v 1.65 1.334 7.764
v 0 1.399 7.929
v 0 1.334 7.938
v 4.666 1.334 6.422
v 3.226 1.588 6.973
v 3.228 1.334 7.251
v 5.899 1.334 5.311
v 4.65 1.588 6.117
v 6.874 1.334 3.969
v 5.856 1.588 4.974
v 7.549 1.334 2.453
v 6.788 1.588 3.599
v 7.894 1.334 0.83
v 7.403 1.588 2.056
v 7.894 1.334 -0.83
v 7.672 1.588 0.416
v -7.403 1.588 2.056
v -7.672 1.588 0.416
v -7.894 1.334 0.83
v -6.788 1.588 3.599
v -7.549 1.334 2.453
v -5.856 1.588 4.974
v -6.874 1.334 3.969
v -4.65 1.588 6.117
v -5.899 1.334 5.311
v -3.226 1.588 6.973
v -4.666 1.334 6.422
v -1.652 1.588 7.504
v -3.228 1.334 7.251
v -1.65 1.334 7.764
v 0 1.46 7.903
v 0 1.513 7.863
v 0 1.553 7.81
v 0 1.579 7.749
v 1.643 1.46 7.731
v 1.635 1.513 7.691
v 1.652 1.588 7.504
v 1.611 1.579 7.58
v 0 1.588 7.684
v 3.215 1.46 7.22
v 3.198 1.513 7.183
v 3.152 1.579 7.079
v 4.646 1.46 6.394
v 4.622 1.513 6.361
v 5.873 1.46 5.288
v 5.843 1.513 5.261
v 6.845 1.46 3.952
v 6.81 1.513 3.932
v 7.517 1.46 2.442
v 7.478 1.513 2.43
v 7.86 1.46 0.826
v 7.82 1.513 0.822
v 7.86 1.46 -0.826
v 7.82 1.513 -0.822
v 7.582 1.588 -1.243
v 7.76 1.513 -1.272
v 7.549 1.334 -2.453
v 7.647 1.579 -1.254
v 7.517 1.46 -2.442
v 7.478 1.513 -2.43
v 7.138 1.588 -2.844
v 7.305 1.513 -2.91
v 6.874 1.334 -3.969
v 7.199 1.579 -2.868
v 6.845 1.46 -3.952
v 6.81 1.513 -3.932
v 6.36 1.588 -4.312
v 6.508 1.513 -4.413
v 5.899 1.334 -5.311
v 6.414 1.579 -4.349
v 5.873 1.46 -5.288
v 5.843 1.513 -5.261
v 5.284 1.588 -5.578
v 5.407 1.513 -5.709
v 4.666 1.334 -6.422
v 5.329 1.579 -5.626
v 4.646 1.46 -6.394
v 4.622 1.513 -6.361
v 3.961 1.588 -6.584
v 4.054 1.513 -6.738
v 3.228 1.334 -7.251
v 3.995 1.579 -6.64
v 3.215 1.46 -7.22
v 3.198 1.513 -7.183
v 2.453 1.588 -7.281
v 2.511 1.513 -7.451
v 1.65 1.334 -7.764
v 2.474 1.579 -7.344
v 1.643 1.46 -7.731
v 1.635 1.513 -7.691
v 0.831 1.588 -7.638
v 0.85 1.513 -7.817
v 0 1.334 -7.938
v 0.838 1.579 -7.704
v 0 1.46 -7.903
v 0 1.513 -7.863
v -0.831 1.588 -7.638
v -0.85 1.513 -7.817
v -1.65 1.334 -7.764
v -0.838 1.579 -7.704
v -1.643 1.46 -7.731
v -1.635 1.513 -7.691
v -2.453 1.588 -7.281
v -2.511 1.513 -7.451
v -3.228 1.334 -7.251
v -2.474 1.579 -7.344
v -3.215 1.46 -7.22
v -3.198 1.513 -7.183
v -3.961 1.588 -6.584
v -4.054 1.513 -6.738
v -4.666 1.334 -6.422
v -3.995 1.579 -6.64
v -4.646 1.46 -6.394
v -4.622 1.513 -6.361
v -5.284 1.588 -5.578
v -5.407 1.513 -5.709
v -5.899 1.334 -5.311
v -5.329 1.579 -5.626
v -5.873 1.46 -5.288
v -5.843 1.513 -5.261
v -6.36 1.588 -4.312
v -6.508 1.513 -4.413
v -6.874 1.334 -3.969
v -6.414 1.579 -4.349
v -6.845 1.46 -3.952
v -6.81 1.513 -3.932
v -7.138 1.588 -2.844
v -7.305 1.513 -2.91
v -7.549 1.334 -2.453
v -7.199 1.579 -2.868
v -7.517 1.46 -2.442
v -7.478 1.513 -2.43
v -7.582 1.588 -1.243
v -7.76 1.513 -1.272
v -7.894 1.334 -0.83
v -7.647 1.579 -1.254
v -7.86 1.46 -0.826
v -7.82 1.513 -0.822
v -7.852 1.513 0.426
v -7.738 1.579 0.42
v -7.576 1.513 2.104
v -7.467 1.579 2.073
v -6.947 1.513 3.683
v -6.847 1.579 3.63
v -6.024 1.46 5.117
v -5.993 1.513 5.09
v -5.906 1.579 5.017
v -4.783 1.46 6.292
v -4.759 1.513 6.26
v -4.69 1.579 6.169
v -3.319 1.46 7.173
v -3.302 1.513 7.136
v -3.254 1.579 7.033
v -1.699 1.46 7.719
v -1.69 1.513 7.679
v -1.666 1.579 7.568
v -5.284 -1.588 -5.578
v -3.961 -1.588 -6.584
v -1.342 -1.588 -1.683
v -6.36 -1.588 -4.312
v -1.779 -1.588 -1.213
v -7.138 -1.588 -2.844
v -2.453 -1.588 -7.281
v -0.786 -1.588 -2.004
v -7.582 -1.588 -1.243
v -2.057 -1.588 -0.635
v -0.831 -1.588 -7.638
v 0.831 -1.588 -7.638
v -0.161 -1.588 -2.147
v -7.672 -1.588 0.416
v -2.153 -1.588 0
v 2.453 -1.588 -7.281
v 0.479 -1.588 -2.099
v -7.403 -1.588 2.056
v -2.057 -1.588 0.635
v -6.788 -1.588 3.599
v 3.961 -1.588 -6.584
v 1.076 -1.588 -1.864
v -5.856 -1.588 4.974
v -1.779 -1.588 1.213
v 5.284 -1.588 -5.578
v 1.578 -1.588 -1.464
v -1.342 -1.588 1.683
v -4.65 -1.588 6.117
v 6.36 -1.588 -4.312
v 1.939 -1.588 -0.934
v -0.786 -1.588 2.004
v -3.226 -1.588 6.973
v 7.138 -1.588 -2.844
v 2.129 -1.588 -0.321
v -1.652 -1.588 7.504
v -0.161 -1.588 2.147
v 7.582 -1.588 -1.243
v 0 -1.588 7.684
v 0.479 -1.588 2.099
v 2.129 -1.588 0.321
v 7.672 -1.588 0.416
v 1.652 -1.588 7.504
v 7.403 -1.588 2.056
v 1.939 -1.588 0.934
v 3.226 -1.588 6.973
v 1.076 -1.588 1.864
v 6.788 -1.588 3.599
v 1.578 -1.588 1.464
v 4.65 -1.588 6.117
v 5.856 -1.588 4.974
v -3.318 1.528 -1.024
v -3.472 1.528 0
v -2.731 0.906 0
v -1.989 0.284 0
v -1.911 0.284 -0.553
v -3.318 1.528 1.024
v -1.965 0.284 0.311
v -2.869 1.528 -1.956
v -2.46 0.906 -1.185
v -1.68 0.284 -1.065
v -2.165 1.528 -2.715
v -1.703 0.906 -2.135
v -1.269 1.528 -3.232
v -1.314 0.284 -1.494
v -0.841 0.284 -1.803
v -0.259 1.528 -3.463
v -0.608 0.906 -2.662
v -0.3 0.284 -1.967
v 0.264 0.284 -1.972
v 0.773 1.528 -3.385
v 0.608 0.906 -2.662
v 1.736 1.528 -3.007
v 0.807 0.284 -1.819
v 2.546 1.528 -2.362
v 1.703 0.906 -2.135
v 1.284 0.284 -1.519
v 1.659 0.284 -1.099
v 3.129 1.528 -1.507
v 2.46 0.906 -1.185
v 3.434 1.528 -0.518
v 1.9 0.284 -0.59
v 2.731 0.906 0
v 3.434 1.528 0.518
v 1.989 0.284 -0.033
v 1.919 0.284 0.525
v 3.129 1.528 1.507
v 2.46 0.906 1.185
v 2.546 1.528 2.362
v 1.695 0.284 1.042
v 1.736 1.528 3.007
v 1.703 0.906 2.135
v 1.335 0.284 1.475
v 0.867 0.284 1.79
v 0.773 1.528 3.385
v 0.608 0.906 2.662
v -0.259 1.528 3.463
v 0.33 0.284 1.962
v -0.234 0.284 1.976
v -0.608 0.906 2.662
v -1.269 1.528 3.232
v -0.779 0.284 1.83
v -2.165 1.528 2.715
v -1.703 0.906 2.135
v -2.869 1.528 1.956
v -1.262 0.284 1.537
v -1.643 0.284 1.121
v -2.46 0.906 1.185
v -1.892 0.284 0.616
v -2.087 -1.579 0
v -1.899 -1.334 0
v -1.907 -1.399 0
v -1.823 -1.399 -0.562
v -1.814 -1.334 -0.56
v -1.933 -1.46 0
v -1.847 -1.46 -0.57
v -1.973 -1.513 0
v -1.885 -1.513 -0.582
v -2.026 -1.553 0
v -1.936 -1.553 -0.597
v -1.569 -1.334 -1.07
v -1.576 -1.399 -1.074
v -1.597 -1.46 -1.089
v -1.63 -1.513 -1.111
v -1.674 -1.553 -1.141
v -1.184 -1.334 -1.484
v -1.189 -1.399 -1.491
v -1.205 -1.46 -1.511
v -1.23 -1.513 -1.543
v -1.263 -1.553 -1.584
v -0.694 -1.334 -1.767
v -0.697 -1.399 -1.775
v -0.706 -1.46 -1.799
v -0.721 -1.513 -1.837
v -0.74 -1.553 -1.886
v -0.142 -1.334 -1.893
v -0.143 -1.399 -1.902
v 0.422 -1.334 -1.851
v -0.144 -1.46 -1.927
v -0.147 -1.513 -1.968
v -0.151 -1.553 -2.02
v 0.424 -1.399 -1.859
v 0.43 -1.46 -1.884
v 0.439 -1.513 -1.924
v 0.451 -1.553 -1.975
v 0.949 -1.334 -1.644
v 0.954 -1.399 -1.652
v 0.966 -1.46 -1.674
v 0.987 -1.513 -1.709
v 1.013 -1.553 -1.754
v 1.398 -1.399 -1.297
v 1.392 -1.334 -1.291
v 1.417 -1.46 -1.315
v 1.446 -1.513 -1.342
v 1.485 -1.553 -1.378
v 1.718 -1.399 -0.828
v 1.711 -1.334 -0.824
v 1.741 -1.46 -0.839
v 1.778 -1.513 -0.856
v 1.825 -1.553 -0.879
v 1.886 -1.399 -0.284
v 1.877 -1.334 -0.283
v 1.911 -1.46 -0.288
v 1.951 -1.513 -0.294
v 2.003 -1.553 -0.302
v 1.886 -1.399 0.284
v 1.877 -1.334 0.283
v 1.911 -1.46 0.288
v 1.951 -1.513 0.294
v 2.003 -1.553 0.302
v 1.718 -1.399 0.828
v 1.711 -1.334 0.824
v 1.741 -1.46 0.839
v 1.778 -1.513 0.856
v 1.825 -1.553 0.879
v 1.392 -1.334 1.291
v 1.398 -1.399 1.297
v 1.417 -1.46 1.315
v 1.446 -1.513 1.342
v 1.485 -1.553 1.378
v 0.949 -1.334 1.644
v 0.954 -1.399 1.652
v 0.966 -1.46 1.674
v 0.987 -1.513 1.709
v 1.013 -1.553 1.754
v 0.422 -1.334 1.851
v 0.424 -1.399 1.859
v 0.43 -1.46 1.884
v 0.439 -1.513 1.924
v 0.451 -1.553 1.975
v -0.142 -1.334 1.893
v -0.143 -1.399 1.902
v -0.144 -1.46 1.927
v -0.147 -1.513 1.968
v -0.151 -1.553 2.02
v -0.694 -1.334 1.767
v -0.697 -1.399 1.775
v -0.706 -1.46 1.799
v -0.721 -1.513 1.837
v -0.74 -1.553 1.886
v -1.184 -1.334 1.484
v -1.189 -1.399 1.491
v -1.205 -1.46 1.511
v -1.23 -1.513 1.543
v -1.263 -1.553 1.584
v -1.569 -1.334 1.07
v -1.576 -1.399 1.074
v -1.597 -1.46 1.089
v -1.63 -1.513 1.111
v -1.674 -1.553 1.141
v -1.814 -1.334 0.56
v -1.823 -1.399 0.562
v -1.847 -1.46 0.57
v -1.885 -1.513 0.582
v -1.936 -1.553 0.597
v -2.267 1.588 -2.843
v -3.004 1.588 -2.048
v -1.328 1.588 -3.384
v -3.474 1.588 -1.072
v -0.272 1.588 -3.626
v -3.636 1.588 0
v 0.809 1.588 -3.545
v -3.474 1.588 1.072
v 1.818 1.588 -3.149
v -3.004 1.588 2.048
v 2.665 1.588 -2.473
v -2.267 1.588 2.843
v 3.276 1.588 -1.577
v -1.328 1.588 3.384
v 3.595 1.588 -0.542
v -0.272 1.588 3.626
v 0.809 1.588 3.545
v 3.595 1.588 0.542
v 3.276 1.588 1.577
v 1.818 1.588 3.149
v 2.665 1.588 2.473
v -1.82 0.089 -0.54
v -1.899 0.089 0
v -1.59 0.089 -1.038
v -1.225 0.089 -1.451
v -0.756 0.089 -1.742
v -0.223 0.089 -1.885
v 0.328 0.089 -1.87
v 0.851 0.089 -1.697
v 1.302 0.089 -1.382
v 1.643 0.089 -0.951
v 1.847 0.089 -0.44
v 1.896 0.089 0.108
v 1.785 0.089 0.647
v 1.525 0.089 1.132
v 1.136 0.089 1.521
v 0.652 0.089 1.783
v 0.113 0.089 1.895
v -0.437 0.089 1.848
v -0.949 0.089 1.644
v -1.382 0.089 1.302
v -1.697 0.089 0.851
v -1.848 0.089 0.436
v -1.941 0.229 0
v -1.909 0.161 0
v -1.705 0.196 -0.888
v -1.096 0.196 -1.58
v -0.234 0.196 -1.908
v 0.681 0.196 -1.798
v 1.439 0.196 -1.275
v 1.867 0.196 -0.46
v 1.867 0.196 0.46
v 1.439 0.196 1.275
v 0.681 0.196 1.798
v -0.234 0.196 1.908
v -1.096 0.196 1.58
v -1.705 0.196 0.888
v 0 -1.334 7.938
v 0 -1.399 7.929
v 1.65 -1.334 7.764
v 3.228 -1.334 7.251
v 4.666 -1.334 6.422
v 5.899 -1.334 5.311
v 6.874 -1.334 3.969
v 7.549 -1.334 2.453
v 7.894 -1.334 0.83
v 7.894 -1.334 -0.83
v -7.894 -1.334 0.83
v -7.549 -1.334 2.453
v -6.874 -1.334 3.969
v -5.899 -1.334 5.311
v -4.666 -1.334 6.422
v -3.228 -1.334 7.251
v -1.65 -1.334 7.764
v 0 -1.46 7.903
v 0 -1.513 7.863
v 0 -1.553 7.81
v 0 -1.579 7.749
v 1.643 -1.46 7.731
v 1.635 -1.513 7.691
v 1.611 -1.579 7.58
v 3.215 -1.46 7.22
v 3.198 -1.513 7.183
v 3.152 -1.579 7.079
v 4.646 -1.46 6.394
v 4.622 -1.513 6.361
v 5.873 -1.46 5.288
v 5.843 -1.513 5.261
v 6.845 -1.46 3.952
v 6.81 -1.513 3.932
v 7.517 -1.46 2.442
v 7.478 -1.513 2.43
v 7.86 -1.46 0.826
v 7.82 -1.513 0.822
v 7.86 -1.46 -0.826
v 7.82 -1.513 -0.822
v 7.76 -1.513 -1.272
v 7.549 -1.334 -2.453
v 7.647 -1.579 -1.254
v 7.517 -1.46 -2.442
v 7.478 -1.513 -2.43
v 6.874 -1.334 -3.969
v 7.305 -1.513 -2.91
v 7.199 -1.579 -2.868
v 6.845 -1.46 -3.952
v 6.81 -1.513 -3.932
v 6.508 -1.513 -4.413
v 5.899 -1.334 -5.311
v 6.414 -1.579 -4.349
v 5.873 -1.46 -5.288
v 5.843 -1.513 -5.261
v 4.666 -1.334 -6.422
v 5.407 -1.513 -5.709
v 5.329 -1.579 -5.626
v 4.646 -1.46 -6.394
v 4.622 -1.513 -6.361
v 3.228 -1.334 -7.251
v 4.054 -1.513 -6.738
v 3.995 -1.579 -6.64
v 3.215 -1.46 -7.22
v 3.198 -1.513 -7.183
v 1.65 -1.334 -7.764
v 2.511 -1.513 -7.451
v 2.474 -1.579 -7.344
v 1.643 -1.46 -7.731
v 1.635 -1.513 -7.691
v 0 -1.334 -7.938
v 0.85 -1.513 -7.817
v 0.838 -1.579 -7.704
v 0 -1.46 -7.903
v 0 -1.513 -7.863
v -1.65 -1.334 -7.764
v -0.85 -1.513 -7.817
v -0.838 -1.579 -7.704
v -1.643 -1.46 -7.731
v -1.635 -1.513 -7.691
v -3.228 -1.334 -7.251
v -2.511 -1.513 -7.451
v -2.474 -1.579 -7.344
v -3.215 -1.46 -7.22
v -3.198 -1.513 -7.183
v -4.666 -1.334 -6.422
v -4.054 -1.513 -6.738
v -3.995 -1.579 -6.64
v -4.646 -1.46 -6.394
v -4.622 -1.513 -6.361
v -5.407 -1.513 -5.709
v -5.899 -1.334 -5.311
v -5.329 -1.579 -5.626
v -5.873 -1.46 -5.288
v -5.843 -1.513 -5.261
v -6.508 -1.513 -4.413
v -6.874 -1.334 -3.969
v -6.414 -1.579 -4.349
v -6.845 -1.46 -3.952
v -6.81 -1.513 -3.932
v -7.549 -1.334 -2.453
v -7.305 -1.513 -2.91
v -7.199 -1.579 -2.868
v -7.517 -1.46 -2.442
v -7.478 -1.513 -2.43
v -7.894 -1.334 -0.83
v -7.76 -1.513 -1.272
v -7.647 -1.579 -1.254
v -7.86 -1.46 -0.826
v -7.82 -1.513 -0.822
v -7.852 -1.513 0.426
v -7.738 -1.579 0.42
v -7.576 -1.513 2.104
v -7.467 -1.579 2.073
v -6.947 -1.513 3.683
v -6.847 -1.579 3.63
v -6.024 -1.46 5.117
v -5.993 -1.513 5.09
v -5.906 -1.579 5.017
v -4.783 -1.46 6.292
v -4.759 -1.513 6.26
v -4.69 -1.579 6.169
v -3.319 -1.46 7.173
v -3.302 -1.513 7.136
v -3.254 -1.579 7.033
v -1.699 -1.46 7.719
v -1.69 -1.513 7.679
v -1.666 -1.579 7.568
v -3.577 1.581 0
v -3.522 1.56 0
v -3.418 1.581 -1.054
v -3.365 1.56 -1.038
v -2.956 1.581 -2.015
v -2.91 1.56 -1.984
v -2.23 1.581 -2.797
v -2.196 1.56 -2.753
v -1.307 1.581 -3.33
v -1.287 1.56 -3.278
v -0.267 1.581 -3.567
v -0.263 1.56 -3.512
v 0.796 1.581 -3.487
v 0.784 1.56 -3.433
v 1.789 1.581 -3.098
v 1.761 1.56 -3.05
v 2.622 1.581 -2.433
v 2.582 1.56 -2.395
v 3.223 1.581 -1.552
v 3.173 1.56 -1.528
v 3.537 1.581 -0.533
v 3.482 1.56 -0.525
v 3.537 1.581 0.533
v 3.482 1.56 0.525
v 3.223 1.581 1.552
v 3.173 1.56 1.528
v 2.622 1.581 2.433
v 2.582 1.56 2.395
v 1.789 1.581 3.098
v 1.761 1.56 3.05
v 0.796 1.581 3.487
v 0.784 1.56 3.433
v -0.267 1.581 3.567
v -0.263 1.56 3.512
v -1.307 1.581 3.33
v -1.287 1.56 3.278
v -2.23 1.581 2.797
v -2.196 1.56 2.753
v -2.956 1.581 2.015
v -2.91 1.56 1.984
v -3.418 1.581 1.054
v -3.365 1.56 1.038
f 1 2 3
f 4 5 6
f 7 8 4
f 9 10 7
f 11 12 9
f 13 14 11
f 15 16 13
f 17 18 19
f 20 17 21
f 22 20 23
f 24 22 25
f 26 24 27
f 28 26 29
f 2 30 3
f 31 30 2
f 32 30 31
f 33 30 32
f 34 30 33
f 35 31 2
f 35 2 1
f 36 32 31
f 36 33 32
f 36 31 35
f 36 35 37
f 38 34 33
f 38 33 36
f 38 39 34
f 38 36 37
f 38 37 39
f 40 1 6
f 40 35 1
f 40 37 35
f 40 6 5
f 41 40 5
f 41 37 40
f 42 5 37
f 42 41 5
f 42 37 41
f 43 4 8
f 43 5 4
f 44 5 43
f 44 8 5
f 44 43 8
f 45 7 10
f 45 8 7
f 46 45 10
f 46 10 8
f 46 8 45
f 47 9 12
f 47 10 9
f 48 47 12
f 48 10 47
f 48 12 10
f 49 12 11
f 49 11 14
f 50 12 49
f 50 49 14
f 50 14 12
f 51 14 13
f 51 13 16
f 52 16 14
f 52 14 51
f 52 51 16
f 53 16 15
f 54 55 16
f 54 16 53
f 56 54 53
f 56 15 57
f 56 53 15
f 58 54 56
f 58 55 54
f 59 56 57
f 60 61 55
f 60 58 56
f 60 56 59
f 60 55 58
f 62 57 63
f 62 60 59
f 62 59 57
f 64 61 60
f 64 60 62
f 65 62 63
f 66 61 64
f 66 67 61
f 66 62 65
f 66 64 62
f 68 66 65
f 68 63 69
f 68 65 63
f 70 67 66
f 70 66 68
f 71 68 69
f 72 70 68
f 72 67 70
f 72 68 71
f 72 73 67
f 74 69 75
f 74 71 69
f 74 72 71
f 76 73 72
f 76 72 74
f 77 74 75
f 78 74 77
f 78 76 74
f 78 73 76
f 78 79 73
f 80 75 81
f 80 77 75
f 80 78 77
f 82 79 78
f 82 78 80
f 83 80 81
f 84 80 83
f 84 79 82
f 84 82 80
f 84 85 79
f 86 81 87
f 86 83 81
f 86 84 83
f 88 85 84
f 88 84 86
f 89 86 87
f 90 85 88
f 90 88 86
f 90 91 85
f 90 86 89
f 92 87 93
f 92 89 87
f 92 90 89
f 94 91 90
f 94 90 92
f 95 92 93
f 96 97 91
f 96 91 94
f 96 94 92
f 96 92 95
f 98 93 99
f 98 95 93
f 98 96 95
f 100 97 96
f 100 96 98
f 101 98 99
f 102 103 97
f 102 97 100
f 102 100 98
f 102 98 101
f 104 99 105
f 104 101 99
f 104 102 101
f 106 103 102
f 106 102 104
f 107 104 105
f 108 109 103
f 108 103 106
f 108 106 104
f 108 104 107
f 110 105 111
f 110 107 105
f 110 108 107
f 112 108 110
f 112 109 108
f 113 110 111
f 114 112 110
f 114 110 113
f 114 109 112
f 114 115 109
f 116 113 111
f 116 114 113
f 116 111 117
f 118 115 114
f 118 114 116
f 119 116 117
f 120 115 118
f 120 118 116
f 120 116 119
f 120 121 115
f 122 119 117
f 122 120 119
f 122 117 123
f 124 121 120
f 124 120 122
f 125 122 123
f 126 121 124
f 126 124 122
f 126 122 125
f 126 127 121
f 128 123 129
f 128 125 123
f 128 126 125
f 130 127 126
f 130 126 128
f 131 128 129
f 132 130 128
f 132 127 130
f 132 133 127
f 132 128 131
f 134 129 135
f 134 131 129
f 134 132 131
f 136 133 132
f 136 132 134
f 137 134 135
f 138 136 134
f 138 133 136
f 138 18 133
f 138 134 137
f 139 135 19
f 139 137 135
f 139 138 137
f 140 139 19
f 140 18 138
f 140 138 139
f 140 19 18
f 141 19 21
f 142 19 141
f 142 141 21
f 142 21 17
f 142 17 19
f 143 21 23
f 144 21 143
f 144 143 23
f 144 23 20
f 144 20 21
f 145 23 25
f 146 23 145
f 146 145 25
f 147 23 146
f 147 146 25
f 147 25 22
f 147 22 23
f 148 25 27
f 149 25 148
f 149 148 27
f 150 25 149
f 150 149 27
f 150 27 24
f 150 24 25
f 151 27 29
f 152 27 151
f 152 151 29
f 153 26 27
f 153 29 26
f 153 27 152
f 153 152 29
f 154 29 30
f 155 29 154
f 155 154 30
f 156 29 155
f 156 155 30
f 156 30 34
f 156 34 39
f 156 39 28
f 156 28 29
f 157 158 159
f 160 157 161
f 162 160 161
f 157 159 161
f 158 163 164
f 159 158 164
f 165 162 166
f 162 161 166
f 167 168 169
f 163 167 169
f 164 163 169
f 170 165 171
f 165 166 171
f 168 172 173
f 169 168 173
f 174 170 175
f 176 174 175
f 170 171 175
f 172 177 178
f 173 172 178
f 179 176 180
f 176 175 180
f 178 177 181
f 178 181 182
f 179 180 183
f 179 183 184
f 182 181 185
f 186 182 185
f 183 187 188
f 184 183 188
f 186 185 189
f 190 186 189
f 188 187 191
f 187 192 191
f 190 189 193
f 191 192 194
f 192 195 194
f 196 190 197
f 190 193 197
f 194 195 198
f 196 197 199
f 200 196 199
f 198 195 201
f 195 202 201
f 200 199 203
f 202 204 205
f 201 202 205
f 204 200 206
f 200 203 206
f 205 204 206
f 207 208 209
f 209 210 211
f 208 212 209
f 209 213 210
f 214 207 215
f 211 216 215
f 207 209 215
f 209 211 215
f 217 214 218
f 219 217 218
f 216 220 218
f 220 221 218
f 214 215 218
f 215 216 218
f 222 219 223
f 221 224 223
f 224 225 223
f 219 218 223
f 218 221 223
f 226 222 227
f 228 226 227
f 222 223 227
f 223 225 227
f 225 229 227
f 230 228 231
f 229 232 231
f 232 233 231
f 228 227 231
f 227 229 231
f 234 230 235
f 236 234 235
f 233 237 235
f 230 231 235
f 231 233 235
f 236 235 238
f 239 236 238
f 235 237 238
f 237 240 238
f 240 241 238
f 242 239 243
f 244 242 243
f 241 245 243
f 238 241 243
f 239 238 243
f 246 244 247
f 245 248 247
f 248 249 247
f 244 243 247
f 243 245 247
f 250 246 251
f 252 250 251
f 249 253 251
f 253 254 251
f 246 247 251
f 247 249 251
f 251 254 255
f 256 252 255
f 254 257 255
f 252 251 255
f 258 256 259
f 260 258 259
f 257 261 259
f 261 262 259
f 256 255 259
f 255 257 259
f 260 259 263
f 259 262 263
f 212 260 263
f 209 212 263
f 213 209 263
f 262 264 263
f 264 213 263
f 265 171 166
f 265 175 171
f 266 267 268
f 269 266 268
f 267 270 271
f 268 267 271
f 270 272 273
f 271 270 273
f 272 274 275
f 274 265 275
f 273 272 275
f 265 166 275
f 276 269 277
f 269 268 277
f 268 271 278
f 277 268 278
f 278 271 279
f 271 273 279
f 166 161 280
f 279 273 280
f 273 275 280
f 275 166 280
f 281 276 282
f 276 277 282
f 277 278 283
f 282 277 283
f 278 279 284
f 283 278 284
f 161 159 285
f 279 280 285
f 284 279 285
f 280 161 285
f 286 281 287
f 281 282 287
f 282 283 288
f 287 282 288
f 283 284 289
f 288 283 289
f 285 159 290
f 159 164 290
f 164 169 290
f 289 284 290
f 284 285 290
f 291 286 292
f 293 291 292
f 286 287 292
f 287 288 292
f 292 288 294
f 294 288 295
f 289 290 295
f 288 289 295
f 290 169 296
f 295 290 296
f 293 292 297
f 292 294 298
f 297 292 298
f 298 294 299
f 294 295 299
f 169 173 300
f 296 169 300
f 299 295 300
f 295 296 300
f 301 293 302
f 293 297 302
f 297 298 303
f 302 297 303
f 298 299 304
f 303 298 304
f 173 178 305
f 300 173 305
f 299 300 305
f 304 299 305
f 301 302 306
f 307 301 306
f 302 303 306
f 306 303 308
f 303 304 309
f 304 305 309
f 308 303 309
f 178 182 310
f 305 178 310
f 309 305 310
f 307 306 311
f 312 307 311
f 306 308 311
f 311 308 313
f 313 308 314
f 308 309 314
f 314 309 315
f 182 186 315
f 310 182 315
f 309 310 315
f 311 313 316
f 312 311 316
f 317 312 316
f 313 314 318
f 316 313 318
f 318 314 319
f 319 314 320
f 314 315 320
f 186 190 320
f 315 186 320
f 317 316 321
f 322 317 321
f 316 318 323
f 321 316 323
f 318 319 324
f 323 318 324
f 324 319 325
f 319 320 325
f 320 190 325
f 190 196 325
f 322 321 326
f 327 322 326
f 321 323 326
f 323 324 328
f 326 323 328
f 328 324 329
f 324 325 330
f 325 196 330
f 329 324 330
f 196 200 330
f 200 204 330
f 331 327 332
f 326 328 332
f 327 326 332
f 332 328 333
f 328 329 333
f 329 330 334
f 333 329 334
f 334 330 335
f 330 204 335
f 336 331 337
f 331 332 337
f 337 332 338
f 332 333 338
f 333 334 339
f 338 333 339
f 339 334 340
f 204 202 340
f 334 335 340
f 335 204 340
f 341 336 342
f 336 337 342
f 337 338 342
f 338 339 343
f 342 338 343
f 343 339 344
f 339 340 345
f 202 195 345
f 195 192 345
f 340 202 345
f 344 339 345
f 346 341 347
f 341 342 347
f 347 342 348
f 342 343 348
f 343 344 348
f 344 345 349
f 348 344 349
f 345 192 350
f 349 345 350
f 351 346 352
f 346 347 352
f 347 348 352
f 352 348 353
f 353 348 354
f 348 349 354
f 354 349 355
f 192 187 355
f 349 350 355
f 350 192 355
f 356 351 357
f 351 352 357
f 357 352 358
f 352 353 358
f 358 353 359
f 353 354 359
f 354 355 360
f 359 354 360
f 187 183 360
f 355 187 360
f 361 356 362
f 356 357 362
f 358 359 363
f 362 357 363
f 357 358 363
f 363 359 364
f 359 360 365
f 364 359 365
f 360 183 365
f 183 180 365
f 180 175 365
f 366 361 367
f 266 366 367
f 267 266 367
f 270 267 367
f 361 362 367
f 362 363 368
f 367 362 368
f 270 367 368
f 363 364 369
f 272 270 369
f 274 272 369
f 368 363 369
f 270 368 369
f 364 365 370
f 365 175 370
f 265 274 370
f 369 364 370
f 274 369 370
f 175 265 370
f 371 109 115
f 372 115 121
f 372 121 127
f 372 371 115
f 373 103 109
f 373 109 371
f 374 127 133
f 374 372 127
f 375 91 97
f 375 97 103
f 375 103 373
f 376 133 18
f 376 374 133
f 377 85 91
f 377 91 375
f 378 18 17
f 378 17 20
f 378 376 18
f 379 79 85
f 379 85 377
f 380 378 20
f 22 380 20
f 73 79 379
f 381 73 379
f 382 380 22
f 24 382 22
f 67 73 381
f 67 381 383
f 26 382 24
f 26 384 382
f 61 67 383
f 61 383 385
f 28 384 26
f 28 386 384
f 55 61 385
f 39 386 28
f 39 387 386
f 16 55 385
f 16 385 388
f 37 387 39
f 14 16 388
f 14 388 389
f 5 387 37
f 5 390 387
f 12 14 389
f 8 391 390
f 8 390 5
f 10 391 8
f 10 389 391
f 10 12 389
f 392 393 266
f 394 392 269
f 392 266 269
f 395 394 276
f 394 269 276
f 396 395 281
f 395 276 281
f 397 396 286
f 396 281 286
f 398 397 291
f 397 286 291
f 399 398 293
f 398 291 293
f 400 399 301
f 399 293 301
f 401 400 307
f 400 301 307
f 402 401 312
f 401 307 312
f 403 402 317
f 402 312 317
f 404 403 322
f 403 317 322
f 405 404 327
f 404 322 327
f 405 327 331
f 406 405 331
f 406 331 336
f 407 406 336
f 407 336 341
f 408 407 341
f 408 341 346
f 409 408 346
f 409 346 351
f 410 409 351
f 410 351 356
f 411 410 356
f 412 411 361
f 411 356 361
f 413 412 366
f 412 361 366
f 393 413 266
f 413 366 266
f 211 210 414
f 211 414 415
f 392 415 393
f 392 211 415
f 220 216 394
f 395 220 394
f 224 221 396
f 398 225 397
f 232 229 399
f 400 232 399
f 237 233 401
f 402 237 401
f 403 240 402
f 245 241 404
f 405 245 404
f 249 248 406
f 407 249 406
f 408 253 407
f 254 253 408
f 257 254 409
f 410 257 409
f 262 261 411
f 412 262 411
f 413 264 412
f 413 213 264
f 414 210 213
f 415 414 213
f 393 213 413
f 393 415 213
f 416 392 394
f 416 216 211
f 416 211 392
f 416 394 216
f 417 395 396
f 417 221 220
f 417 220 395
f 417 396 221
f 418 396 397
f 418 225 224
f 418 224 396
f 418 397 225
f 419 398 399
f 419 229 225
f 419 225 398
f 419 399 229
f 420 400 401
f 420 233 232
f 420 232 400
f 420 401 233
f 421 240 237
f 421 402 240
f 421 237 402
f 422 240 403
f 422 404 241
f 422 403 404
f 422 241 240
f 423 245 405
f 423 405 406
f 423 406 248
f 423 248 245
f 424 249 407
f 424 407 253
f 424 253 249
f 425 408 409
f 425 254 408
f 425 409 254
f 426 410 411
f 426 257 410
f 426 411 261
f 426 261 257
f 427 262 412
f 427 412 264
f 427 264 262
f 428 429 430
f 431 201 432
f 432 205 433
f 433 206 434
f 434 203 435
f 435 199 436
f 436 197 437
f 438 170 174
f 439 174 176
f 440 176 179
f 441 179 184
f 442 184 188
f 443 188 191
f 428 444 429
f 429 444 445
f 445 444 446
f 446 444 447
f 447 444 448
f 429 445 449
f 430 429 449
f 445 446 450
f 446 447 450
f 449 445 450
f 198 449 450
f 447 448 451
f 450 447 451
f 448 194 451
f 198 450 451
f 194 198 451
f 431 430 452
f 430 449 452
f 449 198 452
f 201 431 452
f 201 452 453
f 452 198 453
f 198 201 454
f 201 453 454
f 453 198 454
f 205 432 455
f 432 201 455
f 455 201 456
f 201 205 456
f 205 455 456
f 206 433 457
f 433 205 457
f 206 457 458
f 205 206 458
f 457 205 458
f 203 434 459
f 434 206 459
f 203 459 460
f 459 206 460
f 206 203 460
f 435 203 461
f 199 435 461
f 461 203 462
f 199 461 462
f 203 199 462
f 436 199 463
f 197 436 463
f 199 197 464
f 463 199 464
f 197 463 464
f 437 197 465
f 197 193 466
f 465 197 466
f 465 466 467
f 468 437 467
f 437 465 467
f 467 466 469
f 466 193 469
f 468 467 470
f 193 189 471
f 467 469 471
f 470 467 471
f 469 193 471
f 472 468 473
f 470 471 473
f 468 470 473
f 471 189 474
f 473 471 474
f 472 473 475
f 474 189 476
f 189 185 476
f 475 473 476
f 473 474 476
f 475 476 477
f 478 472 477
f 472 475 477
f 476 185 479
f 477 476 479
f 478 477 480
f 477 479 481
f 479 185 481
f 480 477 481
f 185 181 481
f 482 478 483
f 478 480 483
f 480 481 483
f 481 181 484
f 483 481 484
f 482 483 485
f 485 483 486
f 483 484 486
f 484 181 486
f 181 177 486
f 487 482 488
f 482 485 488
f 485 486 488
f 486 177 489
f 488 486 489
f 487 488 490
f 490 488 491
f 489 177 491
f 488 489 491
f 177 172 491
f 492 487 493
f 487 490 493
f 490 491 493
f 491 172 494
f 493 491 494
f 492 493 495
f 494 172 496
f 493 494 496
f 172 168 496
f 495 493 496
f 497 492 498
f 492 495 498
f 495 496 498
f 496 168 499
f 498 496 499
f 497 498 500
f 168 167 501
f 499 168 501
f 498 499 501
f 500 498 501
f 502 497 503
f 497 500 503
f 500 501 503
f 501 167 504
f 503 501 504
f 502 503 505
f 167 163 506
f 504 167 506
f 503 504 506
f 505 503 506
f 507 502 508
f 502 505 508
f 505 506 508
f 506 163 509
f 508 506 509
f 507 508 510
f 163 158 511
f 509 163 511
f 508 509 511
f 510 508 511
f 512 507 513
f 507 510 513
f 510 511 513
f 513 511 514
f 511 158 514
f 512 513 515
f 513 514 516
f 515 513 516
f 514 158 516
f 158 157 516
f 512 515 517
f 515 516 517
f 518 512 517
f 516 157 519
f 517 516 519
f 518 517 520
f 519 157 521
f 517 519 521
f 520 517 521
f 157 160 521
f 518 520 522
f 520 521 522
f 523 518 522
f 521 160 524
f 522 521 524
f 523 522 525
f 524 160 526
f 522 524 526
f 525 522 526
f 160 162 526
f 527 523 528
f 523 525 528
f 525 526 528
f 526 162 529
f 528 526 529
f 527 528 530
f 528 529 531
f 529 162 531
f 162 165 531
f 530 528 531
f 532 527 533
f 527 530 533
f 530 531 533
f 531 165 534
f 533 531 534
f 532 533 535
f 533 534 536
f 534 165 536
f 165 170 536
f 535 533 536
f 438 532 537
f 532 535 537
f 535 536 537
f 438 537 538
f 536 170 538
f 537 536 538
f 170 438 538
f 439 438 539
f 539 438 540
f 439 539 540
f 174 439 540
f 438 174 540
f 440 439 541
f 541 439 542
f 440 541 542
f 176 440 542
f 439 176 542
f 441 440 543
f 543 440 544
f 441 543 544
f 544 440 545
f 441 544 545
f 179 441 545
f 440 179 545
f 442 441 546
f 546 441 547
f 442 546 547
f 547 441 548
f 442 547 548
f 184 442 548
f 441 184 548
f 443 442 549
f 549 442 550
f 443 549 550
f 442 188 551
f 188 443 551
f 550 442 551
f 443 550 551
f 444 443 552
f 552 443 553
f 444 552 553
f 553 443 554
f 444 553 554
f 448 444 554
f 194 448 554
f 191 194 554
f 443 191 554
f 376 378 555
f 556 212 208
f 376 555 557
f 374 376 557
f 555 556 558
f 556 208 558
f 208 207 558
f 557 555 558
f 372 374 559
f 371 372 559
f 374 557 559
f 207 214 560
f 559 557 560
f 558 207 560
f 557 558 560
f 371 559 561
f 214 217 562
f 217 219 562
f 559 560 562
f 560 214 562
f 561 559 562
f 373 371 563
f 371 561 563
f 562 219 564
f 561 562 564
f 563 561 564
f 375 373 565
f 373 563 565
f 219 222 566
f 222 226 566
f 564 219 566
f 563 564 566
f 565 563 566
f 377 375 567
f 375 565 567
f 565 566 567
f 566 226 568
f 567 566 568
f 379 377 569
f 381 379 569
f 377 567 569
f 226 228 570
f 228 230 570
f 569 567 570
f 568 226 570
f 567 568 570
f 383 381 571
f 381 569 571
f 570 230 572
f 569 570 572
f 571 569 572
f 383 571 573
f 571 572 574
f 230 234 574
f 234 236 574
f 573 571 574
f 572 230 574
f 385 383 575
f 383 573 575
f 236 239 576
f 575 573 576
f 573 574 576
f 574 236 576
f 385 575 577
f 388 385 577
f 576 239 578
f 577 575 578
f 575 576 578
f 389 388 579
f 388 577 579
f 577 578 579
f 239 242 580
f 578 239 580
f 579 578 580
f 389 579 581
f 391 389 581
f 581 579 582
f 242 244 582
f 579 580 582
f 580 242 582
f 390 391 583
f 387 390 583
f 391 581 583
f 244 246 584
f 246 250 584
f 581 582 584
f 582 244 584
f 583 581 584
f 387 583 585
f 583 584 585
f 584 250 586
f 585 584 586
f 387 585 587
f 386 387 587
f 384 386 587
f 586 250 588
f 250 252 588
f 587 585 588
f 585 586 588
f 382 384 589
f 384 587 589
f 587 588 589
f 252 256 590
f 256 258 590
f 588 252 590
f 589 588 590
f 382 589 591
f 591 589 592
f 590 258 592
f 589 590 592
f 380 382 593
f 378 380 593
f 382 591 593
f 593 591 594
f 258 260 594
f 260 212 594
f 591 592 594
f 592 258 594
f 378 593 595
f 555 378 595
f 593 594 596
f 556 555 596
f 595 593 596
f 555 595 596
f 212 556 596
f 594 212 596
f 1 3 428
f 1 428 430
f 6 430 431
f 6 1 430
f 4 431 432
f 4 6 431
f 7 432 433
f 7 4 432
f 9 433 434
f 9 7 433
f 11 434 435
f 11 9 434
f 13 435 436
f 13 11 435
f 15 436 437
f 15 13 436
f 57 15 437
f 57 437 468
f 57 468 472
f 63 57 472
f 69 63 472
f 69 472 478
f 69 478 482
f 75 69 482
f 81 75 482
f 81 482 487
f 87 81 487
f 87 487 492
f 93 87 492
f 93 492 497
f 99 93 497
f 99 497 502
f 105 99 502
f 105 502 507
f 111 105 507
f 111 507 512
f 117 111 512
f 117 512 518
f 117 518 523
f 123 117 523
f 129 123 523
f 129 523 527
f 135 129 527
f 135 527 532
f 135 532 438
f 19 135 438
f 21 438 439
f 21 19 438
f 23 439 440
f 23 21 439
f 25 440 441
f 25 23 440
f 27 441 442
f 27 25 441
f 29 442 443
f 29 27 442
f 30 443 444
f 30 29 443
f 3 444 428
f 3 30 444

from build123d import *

# Parameters (mm, degrees)
SKETCH1_R                                         = 7.9375
BOSS_EXTRUDE1_DEPTH                               = 1.5875
CSK_FOR_6_FLAT_HEAD_MACHINE_SCREW_100_D           = 3.7973
CSK_FOR_6_FLAT_HEAD_MACHINE_SCREW_100_CSINK_D     = 7.0866
CSK_FOR_6_FLAT_HEAD_MACHINE_SCREW_100_CSINK_ANGLE = 100
FILLET1_R                                         = 0.254


with BuildPart() as part:
    # Sketch1 → Boss-Extrude1 (new, symmetric)
    with BuildSketch(Plane(origin=(0, 0, 0), x_dir=(1, 0, 0), z_dir=(0, 1, 0))):
        with Locations(Location((0, 0, 0), (0, 0, 270))):
            Circle(SKETCH1_R)
    extrude(amount=BOSS_EXTRUDE1_DEPTH, both=True)

    # CSK for #6 Flat Head Machine Screw (100)1 (through all)
    with Locations(Plane(origin=(0, 1.5875, 0), x_dir=(1, 0, 0), z_dir=(0, 1, 0))):
        with Locations((0, 0)):
            CounterSinkHole(CSK_FOR_6_FLAT_HEAD_MACHINE_SCREW_100_D / 2, CSK_FOR_6_FLAT_HEAD_MACHINE_SCREW_100_CSINK_D / 2, counter_sink_angle=CSK_FOR_6_FLAT_HEAD_MACHINE_SCREW_100_CSINK_ANGLE)

    # Fillet1
    fillet1_edges = [part.edges().sort_by_distance(p)[0] for p in [
        (0, -1.5875, -7.9375),
        (0, 1.5875, -7.9375),
        (3.5433, 1.5875, 0),
        (1.89865, -1.5875, 0),
        (1.89865, 0.207474792, 0),
    ]]
    fillet(fillet1_edges, radius=FILLET1_R)


solid = part.part
